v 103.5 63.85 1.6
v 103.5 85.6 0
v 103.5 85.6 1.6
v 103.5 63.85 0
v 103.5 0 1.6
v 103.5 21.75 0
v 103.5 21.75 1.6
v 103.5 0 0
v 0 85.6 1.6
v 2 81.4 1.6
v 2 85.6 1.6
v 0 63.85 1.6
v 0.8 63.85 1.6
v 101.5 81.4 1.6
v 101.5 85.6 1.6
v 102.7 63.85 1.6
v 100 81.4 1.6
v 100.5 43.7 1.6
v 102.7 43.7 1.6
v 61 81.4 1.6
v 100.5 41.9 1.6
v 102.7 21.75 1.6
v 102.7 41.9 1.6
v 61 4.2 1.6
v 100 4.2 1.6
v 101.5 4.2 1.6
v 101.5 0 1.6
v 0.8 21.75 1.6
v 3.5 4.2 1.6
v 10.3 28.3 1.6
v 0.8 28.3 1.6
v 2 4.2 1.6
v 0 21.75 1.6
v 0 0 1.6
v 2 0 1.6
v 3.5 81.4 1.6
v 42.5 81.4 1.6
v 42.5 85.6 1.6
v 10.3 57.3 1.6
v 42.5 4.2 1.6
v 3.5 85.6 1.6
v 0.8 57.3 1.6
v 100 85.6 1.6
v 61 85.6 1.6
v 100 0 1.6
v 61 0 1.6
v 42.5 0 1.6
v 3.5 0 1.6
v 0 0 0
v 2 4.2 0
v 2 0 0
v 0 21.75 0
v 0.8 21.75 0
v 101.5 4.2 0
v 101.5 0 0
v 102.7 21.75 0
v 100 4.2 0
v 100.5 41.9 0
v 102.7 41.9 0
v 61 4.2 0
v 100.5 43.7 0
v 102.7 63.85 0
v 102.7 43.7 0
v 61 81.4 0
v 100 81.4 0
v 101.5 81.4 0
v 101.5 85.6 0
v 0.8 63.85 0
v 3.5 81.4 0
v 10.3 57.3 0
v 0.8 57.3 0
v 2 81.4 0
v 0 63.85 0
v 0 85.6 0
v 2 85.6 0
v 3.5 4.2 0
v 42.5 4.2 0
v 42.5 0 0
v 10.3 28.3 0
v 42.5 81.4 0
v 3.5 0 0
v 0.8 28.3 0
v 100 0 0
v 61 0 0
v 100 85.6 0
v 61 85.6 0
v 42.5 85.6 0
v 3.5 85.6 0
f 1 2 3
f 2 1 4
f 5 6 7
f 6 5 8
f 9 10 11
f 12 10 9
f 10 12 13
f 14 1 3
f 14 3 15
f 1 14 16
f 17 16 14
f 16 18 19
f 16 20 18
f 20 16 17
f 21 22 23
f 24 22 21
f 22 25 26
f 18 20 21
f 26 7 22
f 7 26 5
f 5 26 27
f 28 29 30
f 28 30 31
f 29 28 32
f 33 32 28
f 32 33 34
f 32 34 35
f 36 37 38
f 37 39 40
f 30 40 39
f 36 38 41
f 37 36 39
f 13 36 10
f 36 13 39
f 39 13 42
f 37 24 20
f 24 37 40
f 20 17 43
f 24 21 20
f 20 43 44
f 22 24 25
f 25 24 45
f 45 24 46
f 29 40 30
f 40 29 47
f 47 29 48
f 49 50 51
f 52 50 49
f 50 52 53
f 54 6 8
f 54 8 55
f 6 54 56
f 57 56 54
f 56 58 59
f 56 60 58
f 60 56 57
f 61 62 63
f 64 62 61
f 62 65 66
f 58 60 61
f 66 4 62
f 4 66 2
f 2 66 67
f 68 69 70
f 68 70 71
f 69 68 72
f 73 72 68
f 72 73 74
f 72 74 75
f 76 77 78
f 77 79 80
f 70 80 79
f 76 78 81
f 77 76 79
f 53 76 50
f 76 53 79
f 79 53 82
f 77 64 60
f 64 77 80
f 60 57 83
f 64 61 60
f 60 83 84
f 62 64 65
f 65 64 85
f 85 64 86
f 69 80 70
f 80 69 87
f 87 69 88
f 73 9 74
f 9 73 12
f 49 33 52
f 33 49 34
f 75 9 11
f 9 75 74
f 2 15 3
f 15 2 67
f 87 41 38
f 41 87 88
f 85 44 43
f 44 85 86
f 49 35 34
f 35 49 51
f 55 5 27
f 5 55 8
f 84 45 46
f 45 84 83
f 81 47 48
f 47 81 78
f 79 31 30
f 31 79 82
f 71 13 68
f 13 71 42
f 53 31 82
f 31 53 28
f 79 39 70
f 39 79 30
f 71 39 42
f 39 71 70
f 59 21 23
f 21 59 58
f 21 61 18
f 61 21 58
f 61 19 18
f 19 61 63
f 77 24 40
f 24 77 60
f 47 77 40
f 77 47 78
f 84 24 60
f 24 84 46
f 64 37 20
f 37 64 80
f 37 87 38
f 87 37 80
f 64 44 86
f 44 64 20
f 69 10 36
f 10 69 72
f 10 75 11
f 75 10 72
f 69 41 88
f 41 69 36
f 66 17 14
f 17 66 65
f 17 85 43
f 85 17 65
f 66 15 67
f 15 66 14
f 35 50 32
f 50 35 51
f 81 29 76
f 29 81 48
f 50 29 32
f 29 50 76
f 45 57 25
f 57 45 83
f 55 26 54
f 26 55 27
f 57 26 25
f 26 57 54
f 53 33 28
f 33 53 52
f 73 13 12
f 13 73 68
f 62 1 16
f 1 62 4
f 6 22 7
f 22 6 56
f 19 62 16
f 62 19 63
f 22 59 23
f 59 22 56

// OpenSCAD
$fn = 50;

wall = 1.8;
/* length = 107.6-(2*wall); */
length = 107.1-(2*wall);
/* width = 89.7-(2*wall); */
width = 89.2-(2*wall);
height = 1.6;

difference(){

     // base
     cube([length, width, height], center=false);

     // cutout1
     translate([9.5 + 0.8, (width/2) - (29.0/2), 0]) {
          rotate(a=90, v=[0,0,1]) {
               cube([29.0, 9.5, height+1], center=false);
          }
     }

     // cutout2
     translate([length, (width/2) - (wall/2), 0]) {
          rotate(a=90, v=[0,0,1]) {
               cube([wall, 3, height+1], center=false);
          }
     }

     // cutout3
     translate([(length/2) + 18.5 - (18.5/2), 0, 0]) {
          rotate(a=90, v=[0,0,1]) {
               cube([4.2, 18.5, height+1], center=false);
          }
     }

     // cutout4
     translate([(length/2) + 18.5 - (18.5/2), width - 4.2, 0]) {
          rotate(a=90, v=[0,0,1]) {
               cube([4.2, 18.5, height+1], center=false);
          }
     }

     // cutout5
     translate([2 + 1.5, width - 4.2, 0]) {
          rotate(a=90, v=[0,0,1]) {
               cube([4.2, 1.5, height+1], center=false);
          }
     }

     // cutout6
     translate([length - 2, width - 4.2, 0]) {
          rotate(a=90, v=[0,0,1]) {
               cube([4.2, 1.5, height+1], center=false);
          }
     }

     // cutout7
     translate([2 + 1.5, 0, 0]) {
          rotate(a=90, v=[0,0,1]) {
               cube([4.2, 1.5, height+1], center=false);
          }
     }

     // cutout8
     translate([length - 2, 0, 0]) {
          rotate(a=90, v=[0,0,1]) {
               cube([4.2, 1.5, height+1], center=false);
          }
     }

     // cutout9
     translate([0.8, (width/2) - (42.1/2), 0]) {
          rotate(a=90, v=[0,0,1]) {
               cube([42.1, 0.8, height+1], center=false);
          }
     }

     // cutout10
     translate([length, (width/2) - (42.1/2), 0]) {
          rotate(a=90, v=[0,0,1]) {
               cube([42.1, 0.8, height+1], center=false);
          }
     }

}
